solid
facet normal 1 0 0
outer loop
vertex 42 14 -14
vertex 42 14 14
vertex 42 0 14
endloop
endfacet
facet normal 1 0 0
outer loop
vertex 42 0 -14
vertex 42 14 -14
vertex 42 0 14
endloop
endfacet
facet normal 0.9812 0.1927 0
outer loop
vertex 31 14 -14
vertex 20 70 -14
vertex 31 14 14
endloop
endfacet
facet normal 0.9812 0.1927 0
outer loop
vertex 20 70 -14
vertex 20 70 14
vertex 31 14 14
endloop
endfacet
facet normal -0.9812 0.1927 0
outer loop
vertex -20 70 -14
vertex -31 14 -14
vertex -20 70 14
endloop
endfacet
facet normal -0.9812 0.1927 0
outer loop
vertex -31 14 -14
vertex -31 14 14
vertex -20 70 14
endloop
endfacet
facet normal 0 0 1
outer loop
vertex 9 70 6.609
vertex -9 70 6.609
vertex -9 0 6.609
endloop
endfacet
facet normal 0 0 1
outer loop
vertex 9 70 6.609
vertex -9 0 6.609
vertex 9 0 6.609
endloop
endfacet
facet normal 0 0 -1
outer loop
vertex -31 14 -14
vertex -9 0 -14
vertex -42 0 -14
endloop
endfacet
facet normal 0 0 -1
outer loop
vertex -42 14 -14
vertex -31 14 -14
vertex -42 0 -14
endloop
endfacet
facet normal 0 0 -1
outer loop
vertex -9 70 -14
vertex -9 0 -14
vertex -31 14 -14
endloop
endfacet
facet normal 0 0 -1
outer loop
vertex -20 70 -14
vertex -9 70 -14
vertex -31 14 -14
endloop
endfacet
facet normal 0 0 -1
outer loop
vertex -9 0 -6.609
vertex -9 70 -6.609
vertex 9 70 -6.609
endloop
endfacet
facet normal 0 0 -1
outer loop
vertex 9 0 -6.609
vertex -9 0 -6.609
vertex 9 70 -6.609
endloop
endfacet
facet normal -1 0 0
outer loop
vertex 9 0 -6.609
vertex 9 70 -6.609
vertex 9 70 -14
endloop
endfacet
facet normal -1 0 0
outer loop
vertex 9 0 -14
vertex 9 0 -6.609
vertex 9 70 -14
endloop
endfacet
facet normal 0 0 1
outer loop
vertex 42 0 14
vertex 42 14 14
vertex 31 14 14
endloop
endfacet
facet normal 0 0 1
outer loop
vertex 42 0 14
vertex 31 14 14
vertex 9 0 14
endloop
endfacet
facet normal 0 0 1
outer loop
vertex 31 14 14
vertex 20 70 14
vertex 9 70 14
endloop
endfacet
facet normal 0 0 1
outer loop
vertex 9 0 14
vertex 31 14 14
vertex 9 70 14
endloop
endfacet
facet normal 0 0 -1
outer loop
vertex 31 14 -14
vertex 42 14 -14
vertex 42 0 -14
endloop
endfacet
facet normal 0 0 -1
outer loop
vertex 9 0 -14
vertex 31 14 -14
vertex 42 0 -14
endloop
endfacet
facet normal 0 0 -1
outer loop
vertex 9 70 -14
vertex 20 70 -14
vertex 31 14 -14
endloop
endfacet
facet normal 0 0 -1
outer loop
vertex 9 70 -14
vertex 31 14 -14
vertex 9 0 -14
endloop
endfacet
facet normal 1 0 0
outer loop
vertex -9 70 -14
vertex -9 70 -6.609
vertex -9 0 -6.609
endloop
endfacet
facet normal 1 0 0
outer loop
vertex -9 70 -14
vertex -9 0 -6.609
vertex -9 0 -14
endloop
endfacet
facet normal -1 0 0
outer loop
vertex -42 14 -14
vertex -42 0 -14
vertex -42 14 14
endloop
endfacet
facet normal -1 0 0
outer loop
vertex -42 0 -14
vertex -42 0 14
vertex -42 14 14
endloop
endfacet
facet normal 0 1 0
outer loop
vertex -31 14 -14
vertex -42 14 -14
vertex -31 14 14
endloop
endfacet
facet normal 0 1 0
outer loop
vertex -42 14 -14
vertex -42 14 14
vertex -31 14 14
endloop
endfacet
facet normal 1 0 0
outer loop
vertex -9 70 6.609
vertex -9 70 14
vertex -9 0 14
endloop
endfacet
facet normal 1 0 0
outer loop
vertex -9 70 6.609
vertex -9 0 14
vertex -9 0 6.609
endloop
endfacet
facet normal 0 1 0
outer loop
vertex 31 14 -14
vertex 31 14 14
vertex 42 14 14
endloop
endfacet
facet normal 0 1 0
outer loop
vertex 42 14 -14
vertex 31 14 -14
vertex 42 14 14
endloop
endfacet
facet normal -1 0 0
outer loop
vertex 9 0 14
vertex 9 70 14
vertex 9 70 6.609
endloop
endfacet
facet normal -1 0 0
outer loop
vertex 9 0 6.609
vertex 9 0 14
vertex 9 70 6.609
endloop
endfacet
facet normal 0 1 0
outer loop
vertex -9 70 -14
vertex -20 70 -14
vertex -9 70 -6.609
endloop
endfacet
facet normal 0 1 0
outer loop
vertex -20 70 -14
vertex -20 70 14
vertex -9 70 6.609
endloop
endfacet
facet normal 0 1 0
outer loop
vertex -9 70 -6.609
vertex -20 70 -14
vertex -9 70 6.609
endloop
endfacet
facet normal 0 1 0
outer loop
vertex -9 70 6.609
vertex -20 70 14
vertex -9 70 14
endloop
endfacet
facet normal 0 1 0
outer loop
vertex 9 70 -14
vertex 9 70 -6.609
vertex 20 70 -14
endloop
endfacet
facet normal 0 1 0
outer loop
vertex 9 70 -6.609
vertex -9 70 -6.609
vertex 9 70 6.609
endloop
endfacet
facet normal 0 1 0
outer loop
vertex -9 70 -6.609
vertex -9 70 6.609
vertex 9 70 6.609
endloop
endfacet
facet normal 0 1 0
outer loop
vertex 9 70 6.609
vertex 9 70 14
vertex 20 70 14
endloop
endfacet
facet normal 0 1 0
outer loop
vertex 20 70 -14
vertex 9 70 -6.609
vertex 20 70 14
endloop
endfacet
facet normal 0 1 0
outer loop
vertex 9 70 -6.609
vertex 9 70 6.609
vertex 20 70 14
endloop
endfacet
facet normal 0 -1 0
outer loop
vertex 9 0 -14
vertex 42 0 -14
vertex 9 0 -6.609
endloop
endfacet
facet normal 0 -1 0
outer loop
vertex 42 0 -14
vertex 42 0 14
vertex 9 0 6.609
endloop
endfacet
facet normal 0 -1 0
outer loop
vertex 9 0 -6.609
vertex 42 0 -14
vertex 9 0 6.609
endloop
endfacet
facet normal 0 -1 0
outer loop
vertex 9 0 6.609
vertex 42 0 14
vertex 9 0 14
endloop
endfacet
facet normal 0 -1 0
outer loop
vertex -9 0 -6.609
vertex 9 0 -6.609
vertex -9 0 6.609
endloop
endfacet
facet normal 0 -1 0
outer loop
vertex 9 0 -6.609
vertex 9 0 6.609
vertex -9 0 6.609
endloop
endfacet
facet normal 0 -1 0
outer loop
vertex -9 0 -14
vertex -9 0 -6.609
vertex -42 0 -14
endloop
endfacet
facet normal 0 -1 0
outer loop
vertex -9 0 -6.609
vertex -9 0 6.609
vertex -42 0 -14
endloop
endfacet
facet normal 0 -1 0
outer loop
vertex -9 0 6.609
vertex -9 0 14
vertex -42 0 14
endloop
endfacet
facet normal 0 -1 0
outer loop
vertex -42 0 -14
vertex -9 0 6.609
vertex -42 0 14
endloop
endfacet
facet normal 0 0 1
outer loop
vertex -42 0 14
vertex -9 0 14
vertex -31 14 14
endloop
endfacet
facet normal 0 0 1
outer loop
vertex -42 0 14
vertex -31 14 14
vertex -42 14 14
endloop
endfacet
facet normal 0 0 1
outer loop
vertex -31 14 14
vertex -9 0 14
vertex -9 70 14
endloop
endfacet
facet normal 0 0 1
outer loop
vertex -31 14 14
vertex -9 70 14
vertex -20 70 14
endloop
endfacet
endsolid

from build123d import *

# Parameters (mm, degrees)
SALIENTE_EXTRUIR1_DEPTH = 14
CROQUIS3_W              = 18
CROQUIS3_H              = 7.391109276
CORTAR_EXTRUIR1_DEPTH   = 83.825116963


with BuildPart() as part:
    # Croquis1 → Saliente-Extruir1 (new, symmetric)
    with BuildSketch(Plane.XY):
        Polygon((42, 0), (-42, 0), (-42, 14), (-31, 14), (-20, 70), (20, 70), (31, 14), (42, 14), align=None)
    extrude(amount=SALIENTE_EXTRUIR1_DEPTH, both=True)

    # Croquis3 → Cortar-Extruir1 (cut, through all)
    with BuildSketch(Plane(origin=(0, 70, 0), x_dir=(1, 0, 0), z_dir=(0, 1, 0))):
        with Locations((0, 10.304445362)):
            Rectangle(CROQUIS3_W, CROQUIS3_H)
        with Locations((0, -10.304445362)):
            Rectangle(CROQUIS3_W, CROQUIS3_H)
    extrude(amount=-CORTAR_EXTRUIR1_DEPTH, mode=Mode.SUBTRACT)


solid = part.part
